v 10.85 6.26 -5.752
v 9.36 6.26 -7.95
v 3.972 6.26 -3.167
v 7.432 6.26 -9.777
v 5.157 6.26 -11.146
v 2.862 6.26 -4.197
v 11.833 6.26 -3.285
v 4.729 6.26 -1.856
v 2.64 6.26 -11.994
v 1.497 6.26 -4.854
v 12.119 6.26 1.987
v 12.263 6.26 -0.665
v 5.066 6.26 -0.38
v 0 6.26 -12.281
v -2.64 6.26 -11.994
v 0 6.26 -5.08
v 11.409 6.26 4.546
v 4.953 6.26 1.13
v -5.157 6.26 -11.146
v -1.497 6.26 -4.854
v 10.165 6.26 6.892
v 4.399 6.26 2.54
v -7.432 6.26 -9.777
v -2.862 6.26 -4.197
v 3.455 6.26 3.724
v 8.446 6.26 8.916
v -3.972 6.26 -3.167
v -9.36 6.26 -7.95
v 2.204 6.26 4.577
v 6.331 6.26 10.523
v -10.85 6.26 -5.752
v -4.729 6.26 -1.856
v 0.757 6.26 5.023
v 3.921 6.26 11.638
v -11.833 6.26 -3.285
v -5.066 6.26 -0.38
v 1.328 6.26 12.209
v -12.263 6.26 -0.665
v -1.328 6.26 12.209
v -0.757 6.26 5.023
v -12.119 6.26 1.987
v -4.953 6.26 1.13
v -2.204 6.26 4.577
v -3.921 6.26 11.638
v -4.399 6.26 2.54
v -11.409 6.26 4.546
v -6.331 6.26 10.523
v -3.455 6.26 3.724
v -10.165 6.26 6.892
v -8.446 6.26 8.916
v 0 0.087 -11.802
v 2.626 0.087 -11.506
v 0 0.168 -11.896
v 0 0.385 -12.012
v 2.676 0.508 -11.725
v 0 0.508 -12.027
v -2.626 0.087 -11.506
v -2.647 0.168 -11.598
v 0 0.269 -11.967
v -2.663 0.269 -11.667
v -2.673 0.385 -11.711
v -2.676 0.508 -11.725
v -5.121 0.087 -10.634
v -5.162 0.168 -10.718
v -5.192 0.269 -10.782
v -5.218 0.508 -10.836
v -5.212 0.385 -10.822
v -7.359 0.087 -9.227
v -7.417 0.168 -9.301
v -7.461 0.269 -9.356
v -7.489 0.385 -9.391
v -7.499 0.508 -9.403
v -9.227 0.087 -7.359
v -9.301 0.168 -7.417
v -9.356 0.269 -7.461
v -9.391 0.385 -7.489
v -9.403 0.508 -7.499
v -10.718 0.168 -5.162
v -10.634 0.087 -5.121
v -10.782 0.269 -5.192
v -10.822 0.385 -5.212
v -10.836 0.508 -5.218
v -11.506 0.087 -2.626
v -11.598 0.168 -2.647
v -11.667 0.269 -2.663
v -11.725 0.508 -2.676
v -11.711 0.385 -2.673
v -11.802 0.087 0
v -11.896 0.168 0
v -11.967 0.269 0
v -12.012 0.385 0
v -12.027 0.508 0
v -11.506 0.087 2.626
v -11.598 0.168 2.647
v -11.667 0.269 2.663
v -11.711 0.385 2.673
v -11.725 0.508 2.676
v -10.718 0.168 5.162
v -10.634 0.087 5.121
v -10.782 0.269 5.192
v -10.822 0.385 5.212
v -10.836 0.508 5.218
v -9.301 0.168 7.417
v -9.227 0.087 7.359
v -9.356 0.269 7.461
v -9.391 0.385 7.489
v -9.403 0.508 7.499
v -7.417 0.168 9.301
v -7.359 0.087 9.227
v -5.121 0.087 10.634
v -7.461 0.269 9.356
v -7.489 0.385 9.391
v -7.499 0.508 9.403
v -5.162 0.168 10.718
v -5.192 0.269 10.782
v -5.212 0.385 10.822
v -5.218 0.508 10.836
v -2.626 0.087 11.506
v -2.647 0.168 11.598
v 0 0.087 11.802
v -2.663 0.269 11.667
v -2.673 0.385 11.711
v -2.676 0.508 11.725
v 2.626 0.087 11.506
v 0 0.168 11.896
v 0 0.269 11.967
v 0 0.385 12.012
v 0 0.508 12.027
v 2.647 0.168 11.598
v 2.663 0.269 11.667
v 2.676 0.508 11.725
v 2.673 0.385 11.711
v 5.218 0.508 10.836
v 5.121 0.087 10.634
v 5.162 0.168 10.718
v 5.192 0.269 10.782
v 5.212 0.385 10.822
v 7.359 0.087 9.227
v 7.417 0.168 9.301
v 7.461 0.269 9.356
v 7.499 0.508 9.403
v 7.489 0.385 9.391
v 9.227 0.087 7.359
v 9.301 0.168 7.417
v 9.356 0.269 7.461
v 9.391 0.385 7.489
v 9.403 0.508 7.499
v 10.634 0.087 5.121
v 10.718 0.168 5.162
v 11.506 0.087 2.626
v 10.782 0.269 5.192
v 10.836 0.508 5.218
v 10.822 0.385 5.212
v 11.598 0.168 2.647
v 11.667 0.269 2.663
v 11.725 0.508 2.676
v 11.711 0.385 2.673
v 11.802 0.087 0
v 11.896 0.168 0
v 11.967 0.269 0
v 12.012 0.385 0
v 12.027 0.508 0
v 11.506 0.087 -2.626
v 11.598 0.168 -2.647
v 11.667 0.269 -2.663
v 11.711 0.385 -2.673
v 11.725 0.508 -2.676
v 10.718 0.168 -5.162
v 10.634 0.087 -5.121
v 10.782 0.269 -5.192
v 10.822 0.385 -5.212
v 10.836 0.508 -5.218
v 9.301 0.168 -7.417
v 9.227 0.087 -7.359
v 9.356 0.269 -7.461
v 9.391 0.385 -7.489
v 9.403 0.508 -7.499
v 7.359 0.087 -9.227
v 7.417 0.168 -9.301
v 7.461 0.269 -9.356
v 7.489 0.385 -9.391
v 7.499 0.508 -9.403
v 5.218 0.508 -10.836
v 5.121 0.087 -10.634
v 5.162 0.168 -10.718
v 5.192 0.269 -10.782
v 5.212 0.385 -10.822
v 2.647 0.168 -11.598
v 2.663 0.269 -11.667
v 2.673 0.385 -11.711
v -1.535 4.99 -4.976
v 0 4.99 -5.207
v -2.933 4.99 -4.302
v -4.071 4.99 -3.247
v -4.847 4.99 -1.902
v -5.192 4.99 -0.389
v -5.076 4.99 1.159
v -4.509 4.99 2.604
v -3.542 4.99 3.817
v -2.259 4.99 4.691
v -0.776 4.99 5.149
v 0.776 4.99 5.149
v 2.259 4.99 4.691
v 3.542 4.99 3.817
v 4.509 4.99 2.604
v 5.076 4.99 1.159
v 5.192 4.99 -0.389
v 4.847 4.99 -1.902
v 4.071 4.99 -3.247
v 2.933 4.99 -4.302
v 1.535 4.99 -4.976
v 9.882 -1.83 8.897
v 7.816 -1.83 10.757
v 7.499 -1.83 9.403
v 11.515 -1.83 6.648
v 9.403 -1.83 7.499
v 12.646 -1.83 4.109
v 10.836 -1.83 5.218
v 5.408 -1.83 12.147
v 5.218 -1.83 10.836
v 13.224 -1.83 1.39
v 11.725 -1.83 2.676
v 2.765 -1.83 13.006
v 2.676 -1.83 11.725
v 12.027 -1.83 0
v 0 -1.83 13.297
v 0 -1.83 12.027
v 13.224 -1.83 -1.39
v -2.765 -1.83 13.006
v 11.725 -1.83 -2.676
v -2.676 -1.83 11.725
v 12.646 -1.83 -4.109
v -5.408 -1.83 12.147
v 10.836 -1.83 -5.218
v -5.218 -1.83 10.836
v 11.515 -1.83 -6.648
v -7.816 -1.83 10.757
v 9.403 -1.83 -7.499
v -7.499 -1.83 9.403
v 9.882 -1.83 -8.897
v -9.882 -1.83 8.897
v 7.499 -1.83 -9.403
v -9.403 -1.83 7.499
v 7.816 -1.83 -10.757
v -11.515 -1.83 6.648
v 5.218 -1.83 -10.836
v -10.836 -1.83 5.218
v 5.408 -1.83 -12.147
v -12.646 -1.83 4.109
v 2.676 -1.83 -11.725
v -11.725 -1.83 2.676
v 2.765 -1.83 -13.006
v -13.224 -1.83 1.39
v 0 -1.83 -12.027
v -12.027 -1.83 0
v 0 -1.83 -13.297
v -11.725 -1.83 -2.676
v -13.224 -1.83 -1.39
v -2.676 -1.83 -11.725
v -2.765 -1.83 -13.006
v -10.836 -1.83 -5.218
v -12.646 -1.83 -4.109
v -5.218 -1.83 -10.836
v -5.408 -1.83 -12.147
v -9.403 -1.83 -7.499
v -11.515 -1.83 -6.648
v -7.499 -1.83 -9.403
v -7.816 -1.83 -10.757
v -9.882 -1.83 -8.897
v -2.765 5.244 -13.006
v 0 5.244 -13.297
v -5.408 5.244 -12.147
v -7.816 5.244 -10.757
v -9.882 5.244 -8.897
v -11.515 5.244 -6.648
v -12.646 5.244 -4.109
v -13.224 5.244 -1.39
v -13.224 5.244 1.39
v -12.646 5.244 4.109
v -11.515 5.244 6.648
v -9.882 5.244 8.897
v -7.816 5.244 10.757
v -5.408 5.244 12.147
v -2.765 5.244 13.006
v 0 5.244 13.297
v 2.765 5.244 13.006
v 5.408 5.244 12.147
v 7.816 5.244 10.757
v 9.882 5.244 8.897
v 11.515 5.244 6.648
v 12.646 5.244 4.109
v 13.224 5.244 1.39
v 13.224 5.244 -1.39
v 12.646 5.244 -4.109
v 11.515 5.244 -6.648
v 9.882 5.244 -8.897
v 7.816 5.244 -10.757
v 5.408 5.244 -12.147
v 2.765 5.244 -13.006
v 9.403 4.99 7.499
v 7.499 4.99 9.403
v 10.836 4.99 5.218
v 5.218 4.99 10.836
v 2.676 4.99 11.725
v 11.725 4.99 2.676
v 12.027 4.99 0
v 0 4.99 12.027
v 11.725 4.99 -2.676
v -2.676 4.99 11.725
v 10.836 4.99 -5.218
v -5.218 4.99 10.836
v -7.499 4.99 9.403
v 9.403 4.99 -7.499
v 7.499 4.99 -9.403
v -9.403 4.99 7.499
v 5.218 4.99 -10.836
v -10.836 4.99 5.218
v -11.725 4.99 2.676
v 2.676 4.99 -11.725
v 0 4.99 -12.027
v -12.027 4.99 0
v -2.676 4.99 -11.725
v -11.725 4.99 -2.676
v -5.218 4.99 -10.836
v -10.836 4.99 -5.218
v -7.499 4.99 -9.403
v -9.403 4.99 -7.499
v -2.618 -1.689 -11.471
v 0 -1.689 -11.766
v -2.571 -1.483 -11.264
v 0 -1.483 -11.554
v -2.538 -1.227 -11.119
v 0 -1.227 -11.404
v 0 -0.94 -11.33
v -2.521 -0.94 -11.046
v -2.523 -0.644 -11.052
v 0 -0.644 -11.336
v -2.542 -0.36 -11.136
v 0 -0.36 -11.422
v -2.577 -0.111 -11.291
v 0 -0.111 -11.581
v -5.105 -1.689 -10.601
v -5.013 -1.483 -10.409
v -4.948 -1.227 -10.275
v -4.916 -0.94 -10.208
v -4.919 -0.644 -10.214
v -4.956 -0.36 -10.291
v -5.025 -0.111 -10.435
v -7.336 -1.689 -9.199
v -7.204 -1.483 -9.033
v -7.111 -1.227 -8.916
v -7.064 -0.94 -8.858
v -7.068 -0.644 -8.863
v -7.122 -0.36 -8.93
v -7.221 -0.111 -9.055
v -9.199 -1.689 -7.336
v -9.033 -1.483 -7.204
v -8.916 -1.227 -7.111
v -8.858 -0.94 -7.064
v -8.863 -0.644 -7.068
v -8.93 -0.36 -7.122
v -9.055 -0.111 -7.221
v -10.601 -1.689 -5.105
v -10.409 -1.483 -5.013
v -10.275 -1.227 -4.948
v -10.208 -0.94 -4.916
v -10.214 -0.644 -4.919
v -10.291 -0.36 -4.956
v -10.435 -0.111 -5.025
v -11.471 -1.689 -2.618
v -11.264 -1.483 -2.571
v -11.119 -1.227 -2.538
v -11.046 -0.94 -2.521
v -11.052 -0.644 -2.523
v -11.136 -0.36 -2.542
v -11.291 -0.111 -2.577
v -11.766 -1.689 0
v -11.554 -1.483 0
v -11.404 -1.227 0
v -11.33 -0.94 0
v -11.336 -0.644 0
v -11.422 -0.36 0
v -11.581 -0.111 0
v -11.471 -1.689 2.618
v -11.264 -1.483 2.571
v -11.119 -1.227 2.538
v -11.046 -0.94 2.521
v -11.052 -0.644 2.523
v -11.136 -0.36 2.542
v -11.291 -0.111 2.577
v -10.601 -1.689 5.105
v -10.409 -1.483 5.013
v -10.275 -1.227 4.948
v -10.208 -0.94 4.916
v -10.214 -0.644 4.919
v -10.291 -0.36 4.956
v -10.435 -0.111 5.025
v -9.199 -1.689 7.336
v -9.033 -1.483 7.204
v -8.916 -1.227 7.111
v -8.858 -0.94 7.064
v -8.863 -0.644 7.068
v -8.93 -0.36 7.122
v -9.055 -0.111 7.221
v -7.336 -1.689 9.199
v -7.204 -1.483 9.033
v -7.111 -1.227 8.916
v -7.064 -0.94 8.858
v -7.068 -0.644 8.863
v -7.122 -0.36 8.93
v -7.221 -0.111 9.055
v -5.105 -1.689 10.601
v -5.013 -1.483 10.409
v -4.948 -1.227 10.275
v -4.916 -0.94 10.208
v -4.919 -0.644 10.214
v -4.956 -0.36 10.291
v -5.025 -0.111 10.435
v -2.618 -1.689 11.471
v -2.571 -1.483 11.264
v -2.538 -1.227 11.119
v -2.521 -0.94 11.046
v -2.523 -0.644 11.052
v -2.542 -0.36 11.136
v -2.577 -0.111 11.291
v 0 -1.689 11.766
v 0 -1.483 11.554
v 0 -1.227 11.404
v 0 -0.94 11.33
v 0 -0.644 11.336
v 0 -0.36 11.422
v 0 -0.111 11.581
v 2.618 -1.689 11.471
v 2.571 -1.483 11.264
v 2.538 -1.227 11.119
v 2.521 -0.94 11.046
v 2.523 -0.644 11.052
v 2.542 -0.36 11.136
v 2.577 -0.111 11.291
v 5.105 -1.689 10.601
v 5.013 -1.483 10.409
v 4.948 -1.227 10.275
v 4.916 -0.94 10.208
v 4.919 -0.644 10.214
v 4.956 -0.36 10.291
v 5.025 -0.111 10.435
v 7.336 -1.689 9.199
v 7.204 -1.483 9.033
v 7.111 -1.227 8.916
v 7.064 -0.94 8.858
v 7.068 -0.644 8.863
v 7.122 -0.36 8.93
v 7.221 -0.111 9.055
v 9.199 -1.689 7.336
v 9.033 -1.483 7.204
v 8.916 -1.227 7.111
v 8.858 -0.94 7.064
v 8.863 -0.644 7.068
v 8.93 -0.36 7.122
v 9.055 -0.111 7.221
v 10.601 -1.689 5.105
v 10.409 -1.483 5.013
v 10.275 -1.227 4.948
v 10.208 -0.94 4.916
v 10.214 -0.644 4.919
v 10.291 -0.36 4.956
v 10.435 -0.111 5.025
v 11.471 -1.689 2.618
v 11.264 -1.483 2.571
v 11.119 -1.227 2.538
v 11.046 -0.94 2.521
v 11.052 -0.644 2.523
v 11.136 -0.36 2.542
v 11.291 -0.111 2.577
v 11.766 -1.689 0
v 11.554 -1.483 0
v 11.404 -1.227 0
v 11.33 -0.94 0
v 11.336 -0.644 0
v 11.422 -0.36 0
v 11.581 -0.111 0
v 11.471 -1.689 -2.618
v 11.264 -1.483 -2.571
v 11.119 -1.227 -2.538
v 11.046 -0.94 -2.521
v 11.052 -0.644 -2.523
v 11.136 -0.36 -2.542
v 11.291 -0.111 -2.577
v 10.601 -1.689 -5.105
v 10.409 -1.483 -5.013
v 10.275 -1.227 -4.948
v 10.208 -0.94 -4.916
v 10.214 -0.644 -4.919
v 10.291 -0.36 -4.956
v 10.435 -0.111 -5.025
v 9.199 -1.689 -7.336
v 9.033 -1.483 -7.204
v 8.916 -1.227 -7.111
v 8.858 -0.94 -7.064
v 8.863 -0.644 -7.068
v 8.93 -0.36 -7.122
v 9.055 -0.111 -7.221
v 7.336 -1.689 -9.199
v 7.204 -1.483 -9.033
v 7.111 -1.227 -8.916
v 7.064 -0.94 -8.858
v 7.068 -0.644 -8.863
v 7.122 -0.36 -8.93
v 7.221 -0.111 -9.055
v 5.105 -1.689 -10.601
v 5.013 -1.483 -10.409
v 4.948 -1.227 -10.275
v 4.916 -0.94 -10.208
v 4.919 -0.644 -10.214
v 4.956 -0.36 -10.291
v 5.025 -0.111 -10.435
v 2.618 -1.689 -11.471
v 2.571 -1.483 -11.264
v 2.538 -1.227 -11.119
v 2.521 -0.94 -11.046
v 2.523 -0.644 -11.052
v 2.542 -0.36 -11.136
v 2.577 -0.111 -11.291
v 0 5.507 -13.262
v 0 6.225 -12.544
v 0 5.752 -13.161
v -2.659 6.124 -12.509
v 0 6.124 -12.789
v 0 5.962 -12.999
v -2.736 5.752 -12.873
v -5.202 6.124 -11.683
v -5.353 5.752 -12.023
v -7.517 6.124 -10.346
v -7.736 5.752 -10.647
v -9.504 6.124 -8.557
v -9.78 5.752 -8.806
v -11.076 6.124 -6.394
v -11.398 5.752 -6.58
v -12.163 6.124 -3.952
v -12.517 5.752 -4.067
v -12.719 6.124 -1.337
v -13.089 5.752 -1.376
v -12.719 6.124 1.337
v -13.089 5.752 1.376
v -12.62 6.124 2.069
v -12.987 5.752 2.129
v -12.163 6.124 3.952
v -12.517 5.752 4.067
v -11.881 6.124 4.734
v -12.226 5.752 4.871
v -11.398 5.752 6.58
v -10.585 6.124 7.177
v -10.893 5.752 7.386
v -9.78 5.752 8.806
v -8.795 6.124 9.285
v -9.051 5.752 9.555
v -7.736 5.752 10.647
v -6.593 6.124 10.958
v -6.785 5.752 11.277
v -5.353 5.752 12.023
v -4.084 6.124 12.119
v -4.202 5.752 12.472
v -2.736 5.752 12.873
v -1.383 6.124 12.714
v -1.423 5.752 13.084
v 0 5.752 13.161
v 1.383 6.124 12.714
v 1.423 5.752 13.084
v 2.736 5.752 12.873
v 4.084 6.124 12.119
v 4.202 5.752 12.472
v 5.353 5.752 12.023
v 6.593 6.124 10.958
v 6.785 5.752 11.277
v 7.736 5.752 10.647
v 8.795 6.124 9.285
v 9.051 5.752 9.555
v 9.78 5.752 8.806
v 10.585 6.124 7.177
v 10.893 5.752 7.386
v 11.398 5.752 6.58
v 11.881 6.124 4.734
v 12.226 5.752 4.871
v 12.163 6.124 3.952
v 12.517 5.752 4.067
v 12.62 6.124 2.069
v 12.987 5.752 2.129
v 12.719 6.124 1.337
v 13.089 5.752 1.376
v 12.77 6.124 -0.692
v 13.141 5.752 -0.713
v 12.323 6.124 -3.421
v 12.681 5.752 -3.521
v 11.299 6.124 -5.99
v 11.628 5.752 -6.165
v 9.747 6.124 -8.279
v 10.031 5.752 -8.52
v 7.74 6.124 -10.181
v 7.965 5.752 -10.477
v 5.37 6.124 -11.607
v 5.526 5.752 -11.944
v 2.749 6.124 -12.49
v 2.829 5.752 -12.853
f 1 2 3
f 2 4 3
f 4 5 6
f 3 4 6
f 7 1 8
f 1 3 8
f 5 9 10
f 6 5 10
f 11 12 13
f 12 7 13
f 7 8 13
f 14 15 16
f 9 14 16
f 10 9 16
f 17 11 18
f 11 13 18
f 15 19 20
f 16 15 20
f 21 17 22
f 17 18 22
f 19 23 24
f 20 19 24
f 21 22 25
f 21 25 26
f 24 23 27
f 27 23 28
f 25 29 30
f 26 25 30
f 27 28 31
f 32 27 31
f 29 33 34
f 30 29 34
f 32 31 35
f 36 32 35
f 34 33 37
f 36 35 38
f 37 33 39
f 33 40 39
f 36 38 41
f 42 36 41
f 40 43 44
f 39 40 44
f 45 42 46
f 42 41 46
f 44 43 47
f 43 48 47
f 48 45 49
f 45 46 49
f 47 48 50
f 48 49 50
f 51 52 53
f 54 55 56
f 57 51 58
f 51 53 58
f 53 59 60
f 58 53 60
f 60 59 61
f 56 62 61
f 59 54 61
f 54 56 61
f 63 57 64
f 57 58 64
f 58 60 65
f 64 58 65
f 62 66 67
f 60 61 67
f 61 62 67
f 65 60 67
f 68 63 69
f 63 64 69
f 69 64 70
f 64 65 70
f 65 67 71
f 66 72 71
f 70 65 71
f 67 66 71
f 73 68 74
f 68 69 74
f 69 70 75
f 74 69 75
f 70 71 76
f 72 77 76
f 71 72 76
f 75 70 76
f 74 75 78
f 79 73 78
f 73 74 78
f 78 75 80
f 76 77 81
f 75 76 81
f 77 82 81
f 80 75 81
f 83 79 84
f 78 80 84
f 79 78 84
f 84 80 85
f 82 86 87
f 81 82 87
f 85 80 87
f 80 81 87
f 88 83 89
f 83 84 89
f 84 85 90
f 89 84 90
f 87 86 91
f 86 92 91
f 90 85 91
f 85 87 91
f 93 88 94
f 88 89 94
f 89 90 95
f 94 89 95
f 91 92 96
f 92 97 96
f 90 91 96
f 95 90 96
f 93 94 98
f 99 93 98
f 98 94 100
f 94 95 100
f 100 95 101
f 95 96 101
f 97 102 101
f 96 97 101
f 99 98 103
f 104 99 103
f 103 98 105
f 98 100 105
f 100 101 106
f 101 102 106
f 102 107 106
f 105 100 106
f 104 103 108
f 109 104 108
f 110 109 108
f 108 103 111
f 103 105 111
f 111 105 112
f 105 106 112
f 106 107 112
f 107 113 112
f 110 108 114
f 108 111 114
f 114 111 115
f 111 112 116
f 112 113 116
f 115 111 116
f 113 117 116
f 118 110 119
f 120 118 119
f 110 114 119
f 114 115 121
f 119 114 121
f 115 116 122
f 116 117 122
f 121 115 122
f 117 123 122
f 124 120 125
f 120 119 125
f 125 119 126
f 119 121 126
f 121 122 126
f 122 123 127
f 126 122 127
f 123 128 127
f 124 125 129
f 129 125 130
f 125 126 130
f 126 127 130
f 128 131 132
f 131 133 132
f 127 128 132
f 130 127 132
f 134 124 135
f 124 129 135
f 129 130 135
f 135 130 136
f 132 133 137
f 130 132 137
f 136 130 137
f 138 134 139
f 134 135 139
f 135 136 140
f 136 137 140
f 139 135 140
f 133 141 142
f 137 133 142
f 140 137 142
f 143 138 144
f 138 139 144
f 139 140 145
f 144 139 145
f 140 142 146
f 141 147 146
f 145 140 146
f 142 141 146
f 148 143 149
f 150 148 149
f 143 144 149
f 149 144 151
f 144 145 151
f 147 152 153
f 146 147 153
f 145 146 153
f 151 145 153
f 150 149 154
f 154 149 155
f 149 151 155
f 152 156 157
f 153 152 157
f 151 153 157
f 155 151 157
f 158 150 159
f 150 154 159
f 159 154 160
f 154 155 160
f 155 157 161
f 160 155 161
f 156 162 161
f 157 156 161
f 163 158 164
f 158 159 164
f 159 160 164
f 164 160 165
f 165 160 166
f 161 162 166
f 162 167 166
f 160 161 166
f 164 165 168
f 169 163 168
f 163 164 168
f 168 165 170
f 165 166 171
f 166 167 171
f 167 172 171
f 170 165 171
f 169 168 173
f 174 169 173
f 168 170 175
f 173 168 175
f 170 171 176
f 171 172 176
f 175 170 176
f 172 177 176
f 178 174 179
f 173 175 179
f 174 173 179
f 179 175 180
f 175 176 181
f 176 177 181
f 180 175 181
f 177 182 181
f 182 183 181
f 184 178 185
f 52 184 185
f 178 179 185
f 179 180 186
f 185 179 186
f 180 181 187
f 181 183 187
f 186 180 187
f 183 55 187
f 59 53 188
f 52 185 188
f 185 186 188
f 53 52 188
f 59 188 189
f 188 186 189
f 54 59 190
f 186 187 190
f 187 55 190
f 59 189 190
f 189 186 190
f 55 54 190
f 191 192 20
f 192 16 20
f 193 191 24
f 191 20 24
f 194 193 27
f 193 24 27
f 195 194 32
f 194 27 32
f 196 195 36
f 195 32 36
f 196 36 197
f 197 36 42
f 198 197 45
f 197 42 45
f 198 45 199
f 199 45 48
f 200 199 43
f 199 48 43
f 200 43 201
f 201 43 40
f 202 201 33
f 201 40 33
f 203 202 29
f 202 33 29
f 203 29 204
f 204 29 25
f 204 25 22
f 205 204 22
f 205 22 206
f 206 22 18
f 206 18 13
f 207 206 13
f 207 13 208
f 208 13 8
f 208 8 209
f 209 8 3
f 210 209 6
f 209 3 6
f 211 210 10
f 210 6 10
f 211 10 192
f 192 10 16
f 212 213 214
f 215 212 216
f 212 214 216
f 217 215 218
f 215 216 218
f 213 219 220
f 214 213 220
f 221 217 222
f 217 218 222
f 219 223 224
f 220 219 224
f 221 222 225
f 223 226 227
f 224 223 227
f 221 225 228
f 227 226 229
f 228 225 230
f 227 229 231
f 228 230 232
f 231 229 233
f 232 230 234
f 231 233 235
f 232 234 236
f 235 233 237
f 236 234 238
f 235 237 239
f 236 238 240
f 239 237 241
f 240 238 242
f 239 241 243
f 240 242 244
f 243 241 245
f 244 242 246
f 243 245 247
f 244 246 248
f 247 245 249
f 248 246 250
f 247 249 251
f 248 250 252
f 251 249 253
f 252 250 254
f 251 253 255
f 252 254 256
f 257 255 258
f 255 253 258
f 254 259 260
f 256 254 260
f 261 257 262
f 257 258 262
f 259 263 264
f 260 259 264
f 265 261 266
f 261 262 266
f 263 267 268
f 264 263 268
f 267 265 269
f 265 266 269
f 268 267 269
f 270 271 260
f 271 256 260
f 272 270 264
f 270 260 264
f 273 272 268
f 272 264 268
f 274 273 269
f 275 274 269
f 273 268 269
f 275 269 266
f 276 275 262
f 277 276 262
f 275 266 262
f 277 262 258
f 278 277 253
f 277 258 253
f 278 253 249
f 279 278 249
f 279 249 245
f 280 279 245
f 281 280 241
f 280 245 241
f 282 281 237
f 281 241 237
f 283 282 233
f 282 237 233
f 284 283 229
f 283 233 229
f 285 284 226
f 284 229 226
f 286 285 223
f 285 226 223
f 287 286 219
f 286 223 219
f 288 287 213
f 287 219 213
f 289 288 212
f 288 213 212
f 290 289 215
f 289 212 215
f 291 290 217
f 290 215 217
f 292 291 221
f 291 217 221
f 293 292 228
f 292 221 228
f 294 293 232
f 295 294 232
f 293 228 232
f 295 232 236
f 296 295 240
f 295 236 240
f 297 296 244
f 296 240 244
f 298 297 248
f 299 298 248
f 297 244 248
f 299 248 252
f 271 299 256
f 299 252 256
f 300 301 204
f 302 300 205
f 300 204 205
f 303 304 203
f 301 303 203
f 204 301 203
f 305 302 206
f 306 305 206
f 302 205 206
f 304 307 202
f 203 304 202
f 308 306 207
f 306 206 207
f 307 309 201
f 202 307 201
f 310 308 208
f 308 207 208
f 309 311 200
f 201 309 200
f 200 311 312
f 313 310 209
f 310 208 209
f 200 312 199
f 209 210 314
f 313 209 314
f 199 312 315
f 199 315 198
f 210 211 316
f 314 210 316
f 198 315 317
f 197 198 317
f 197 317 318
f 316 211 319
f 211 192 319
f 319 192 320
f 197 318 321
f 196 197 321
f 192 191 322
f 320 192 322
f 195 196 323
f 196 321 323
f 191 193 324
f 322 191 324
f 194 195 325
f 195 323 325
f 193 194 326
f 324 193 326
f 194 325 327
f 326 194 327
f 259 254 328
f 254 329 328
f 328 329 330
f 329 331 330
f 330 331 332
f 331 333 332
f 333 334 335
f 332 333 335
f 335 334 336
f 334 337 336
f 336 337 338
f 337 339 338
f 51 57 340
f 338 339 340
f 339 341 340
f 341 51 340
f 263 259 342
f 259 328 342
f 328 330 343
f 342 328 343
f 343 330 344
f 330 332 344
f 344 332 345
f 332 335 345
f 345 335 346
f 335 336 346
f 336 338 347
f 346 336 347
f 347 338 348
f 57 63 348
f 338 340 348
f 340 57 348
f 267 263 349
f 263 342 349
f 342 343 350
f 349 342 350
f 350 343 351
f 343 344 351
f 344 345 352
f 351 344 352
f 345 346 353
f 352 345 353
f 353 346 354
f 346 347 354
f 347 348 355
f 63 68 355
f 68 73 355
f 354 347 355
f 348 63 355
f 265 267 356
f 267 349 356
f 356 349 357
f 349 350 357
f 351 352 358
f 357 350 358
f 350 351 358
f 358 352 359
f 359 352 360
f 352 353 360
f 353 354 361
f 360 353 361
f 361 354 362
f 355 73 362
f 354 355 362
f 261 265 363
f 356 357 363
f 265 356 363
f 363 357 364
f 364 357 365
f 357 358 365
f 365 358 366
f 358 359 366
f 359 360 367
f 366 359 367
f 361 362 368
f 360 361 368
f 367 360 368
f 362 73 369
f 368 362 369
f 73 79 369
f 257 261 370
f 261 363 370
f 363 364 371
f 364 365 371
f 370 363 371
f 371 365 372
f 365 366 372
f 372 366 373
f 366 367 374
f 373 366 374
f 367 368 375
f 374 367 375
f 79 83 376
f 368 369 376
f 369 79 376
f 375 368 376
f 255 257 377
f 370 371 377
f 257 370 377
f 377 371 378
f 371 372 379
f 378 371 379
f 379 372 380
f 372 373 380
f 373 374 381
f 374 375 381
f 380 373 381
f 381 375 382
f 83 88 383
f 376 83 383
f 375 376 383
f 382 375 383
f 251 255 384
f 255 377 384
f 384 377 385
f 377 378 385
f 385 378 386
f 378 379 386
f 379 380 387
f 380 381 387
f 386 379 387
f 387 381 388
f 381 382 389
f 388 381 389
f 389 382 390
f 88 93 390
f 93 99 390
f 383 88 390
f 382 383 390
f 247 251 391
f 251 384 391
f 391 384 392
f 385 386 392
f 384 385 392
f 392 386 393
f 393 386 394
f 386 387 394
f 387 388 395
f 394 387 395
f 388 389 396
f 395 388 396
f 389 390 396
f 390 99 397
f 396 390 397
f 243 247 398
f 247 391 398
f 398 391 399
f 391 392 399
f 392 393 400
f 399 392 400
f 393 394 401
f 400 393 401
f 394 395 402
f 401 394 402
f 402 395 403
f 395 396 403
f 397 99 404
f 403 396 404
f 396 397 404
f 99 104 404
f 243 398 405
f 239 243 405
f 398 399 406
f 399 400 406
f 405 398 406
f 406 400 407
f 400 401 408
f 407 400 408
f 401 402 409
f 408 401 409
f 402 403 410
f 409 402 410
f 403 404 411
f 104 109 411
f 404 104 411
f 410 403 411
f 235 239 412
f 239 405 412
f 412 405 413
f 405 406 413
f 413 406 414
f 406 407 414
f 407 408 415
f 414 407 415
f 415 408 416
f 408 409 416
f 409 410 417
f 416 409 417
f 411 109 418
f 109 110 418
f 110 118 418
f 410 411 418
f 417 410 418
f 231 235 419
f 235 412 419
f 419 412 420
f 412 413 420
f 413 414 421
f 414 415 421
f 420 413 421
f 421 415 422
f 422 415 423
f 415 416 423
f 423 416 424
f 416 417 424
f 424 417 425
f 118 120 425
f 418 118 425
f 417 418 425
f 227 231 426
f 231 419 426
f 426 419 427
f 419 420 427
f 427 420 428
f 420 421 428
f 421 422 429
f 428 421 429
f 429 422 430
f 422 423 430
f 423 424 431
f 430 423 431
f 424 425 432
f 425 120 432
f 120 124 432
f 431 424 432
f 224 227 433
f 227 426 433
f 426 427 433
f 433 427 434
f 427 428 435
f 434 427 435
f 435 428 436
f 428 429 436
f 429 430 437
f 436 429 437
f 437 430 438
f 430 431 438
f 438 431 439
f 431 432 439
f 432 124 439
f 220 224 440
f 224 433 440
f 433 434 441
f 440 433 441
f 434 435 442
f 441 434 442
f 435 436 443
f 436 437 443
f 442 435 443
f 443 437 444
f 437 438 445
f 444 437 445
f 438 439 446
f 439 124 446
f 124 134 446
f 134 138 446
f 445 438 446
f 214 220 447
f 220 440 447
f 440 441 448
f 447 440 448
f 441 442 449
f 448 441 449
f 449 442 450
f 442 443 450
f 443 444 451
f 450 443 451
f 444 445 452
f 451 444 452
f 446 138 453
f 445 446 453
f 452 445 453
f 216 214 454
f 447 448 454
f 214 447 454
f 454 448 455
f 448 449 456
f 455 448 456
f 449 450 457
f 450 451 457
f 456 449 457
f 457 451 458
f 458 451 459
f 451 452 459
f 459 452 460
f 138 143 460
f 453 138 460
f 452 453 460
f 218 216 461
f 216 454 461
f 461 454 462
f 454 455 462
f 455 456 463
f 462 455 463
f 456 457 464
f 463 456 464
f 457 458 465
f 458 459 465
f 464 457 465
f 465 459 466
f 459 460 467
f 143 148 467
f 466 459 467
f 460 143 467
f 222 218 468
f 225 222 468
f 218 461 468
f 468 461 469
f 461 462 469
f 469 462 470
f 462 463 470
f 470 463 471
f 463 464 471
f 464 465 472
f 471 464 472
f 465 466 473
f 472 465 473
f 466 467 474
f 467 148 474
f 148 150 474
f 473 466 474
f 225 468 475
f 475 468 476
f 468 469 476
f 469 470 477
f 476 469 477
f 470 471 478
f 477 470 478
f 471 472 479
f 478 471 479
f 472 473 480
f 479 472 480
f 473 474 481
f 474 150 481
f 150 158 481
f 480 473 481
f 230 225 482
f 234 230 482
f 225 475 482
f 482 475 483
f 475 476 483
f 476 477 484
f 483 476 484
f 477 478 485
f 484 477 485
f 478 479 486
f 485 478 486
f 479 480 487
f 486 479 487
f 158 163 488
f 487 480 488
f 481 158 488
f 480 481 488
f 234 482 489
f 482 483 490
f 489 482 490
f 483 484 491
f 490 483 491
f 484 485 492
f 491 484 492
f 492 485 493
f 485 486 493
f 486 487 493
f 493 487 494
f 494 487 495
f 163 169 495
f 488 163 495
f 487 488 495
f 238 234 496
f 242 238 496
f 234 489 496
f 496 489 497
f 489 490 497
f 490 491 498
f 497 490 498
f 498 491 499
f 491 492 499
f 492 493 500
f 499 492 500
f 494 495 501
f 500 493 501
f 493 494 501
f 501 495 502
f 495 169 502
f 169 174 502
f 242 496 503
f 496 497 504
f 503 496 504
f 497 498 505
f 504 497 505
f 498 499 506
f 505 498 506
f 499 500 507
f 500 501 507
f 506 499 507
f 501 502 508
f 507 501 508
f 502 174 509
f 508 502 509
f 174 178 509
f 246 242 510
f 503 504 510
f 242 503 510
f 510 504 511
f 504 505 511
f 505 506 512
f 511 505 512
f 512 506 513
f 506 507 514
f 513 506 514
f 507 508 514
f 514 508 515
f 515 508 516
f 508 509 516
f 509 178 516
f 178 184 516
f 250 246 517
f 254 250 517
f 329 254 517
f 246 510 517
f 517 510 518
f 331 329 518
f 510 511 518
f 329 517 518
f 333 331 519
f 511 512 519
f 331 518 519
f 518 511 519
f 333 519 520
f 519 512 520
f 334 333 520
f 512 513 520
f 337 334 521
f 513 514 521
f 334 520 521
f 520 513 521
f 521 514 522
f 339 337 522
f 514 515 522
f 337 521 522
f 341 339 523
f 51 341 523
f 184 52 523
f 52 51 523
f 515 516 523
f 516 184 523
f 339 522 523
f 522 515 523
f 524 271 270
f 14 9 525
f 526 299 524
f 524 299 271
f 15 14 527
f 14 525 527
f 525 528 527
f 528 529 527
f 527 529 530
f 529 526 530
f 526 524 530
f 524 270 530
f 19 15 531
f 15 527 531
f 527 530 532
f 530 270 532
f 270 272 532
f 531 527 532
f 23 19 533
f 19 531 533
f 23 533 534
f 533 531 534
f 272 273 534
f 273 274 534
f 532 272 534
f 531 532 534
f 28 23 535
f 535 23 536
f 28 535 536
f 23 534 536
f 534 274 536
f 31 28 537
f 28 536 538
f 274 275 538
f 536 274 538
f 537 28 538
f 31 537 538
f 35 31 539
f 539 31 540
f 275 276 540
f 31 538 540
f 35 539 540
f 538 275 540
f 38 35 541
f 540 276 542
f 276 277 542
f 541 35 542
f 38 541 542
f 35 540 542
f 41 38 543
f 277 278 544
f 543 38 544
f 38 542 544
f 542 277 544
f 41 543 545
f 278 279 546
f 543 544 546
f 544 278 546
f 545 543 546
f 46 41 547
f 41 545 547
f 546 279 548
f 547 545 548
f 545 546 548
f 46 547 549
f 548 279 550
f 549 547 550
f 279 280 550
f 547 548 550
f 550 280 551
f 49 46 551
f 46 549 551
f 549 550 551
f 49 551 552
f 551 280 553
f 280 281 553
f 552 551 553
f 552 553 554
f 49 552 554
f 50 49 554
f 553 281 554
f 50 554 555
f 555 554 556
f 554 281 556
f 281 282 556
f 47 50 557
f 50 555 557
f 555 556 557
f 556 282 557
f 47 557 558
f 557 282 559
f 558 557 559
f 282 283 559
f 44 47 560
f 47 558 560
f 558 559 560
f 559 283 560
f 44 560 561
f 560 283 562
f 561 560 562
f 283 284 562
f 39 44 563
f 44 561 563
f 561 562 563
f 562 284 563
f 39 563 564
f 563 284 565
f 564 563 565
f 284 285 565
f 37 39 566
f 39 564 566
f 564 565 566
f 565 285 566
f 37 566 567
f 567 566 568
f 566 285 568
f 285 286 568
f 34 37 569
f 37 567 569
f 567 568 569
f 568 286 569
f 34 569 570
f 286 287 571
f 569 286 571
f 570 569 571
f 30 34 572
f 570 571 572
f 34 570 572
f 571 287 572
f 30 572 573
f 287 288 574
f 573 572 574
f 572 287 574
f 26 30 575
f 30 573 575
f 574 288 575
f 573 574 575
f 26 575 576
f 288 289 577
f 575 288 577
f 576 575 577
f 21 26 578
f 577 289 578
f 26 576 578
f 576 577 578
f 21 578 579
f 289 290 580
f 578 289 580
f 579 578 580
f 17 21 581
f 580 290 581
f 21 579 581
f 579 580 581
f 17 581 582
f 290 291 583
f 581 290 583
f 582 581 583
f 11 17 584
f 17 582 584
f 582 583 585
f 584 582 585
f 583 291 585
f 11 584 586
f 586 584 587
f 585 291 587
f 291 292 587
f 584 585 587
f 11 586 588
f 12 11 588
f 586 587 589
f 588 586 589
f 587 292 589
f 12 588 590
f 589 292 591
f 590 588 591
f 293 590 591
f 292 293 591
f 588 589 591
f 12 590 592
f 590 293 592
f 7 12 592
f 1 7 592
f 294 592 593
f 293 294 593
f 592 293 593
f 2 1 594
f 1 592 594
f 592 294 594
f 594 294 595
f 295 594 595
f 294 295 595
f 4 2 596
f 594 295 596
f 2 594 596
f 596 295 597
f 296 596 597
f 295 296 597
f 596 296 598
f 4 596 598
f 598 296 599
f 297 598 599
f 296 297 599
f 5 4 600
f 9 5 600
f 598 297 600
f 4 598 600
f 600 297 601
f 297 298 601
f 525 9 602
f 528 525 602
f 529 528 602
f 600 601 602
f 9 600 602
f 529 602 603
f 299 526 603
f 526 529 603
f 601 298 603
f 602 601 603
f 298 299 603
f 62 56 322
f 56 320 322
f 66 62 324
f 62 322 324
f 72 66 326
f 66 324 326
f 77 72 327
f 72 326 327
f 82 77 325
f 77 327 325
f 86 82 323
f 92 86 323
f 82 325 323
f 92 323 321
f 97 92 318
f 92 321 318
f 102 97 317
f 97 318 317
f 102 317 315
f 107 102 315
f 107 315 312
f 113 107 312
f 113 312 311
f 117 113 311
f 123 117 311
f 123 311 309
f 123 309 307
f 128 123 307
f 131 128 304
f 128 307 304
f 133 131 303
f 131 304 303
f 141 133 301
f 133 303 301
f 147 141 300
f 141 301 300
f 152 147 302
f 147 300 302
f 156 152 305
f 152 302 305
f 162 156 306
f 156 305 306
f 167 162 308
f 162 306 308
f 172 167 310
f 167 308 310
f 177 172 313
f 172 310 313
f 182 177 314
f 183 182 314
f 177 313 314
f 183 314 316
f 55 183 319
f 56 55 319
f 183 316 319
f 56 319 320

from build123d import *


with BuildPart() as part:
    # Sketch1 → Revolve1 (revolve)
    with BuildSketch(Plane.XY, mode=Mode.PRIVATE) as revolve1_sk:
        with BuildLine():
            Line((12.0269, 0.508129433), (12.0269, 4.990057463))
            Line((12.0269, 4.990057463), (5.207, 4.990057463))
            Line((5.207, 4.990057463), (5.08, 6.260057463))
            Line((5.08, 6.260057463), (12.2809, 6.260057463))
            ThreePointArc((12.2809, 6.260057463), (12.99932049, 5.962477952), (13.2969, 5.244057463))
            Line((13.2969, 5.244057463), (13.2969, -1.829842537))
            Line((13.2969, -1.829842537), (12.0269, -1.829842537))
            ThreePointArc((12.0269, -1.829842537), (11.330182262, -0.940102098), (11.802382058, 0.086582375))
            ThreePointArc((11.802382058, 0.086582375), (11.967270876, 0.269325), (12.0269, 0.508129433))
        make_face()
    revolve(revolve1_sk.sketch.rotate(Axis((0, 0, 0), (0, 1, 0)), 90), axis=Axis((0, 0, 0), (0, 1, 0)))


solid = part.part
